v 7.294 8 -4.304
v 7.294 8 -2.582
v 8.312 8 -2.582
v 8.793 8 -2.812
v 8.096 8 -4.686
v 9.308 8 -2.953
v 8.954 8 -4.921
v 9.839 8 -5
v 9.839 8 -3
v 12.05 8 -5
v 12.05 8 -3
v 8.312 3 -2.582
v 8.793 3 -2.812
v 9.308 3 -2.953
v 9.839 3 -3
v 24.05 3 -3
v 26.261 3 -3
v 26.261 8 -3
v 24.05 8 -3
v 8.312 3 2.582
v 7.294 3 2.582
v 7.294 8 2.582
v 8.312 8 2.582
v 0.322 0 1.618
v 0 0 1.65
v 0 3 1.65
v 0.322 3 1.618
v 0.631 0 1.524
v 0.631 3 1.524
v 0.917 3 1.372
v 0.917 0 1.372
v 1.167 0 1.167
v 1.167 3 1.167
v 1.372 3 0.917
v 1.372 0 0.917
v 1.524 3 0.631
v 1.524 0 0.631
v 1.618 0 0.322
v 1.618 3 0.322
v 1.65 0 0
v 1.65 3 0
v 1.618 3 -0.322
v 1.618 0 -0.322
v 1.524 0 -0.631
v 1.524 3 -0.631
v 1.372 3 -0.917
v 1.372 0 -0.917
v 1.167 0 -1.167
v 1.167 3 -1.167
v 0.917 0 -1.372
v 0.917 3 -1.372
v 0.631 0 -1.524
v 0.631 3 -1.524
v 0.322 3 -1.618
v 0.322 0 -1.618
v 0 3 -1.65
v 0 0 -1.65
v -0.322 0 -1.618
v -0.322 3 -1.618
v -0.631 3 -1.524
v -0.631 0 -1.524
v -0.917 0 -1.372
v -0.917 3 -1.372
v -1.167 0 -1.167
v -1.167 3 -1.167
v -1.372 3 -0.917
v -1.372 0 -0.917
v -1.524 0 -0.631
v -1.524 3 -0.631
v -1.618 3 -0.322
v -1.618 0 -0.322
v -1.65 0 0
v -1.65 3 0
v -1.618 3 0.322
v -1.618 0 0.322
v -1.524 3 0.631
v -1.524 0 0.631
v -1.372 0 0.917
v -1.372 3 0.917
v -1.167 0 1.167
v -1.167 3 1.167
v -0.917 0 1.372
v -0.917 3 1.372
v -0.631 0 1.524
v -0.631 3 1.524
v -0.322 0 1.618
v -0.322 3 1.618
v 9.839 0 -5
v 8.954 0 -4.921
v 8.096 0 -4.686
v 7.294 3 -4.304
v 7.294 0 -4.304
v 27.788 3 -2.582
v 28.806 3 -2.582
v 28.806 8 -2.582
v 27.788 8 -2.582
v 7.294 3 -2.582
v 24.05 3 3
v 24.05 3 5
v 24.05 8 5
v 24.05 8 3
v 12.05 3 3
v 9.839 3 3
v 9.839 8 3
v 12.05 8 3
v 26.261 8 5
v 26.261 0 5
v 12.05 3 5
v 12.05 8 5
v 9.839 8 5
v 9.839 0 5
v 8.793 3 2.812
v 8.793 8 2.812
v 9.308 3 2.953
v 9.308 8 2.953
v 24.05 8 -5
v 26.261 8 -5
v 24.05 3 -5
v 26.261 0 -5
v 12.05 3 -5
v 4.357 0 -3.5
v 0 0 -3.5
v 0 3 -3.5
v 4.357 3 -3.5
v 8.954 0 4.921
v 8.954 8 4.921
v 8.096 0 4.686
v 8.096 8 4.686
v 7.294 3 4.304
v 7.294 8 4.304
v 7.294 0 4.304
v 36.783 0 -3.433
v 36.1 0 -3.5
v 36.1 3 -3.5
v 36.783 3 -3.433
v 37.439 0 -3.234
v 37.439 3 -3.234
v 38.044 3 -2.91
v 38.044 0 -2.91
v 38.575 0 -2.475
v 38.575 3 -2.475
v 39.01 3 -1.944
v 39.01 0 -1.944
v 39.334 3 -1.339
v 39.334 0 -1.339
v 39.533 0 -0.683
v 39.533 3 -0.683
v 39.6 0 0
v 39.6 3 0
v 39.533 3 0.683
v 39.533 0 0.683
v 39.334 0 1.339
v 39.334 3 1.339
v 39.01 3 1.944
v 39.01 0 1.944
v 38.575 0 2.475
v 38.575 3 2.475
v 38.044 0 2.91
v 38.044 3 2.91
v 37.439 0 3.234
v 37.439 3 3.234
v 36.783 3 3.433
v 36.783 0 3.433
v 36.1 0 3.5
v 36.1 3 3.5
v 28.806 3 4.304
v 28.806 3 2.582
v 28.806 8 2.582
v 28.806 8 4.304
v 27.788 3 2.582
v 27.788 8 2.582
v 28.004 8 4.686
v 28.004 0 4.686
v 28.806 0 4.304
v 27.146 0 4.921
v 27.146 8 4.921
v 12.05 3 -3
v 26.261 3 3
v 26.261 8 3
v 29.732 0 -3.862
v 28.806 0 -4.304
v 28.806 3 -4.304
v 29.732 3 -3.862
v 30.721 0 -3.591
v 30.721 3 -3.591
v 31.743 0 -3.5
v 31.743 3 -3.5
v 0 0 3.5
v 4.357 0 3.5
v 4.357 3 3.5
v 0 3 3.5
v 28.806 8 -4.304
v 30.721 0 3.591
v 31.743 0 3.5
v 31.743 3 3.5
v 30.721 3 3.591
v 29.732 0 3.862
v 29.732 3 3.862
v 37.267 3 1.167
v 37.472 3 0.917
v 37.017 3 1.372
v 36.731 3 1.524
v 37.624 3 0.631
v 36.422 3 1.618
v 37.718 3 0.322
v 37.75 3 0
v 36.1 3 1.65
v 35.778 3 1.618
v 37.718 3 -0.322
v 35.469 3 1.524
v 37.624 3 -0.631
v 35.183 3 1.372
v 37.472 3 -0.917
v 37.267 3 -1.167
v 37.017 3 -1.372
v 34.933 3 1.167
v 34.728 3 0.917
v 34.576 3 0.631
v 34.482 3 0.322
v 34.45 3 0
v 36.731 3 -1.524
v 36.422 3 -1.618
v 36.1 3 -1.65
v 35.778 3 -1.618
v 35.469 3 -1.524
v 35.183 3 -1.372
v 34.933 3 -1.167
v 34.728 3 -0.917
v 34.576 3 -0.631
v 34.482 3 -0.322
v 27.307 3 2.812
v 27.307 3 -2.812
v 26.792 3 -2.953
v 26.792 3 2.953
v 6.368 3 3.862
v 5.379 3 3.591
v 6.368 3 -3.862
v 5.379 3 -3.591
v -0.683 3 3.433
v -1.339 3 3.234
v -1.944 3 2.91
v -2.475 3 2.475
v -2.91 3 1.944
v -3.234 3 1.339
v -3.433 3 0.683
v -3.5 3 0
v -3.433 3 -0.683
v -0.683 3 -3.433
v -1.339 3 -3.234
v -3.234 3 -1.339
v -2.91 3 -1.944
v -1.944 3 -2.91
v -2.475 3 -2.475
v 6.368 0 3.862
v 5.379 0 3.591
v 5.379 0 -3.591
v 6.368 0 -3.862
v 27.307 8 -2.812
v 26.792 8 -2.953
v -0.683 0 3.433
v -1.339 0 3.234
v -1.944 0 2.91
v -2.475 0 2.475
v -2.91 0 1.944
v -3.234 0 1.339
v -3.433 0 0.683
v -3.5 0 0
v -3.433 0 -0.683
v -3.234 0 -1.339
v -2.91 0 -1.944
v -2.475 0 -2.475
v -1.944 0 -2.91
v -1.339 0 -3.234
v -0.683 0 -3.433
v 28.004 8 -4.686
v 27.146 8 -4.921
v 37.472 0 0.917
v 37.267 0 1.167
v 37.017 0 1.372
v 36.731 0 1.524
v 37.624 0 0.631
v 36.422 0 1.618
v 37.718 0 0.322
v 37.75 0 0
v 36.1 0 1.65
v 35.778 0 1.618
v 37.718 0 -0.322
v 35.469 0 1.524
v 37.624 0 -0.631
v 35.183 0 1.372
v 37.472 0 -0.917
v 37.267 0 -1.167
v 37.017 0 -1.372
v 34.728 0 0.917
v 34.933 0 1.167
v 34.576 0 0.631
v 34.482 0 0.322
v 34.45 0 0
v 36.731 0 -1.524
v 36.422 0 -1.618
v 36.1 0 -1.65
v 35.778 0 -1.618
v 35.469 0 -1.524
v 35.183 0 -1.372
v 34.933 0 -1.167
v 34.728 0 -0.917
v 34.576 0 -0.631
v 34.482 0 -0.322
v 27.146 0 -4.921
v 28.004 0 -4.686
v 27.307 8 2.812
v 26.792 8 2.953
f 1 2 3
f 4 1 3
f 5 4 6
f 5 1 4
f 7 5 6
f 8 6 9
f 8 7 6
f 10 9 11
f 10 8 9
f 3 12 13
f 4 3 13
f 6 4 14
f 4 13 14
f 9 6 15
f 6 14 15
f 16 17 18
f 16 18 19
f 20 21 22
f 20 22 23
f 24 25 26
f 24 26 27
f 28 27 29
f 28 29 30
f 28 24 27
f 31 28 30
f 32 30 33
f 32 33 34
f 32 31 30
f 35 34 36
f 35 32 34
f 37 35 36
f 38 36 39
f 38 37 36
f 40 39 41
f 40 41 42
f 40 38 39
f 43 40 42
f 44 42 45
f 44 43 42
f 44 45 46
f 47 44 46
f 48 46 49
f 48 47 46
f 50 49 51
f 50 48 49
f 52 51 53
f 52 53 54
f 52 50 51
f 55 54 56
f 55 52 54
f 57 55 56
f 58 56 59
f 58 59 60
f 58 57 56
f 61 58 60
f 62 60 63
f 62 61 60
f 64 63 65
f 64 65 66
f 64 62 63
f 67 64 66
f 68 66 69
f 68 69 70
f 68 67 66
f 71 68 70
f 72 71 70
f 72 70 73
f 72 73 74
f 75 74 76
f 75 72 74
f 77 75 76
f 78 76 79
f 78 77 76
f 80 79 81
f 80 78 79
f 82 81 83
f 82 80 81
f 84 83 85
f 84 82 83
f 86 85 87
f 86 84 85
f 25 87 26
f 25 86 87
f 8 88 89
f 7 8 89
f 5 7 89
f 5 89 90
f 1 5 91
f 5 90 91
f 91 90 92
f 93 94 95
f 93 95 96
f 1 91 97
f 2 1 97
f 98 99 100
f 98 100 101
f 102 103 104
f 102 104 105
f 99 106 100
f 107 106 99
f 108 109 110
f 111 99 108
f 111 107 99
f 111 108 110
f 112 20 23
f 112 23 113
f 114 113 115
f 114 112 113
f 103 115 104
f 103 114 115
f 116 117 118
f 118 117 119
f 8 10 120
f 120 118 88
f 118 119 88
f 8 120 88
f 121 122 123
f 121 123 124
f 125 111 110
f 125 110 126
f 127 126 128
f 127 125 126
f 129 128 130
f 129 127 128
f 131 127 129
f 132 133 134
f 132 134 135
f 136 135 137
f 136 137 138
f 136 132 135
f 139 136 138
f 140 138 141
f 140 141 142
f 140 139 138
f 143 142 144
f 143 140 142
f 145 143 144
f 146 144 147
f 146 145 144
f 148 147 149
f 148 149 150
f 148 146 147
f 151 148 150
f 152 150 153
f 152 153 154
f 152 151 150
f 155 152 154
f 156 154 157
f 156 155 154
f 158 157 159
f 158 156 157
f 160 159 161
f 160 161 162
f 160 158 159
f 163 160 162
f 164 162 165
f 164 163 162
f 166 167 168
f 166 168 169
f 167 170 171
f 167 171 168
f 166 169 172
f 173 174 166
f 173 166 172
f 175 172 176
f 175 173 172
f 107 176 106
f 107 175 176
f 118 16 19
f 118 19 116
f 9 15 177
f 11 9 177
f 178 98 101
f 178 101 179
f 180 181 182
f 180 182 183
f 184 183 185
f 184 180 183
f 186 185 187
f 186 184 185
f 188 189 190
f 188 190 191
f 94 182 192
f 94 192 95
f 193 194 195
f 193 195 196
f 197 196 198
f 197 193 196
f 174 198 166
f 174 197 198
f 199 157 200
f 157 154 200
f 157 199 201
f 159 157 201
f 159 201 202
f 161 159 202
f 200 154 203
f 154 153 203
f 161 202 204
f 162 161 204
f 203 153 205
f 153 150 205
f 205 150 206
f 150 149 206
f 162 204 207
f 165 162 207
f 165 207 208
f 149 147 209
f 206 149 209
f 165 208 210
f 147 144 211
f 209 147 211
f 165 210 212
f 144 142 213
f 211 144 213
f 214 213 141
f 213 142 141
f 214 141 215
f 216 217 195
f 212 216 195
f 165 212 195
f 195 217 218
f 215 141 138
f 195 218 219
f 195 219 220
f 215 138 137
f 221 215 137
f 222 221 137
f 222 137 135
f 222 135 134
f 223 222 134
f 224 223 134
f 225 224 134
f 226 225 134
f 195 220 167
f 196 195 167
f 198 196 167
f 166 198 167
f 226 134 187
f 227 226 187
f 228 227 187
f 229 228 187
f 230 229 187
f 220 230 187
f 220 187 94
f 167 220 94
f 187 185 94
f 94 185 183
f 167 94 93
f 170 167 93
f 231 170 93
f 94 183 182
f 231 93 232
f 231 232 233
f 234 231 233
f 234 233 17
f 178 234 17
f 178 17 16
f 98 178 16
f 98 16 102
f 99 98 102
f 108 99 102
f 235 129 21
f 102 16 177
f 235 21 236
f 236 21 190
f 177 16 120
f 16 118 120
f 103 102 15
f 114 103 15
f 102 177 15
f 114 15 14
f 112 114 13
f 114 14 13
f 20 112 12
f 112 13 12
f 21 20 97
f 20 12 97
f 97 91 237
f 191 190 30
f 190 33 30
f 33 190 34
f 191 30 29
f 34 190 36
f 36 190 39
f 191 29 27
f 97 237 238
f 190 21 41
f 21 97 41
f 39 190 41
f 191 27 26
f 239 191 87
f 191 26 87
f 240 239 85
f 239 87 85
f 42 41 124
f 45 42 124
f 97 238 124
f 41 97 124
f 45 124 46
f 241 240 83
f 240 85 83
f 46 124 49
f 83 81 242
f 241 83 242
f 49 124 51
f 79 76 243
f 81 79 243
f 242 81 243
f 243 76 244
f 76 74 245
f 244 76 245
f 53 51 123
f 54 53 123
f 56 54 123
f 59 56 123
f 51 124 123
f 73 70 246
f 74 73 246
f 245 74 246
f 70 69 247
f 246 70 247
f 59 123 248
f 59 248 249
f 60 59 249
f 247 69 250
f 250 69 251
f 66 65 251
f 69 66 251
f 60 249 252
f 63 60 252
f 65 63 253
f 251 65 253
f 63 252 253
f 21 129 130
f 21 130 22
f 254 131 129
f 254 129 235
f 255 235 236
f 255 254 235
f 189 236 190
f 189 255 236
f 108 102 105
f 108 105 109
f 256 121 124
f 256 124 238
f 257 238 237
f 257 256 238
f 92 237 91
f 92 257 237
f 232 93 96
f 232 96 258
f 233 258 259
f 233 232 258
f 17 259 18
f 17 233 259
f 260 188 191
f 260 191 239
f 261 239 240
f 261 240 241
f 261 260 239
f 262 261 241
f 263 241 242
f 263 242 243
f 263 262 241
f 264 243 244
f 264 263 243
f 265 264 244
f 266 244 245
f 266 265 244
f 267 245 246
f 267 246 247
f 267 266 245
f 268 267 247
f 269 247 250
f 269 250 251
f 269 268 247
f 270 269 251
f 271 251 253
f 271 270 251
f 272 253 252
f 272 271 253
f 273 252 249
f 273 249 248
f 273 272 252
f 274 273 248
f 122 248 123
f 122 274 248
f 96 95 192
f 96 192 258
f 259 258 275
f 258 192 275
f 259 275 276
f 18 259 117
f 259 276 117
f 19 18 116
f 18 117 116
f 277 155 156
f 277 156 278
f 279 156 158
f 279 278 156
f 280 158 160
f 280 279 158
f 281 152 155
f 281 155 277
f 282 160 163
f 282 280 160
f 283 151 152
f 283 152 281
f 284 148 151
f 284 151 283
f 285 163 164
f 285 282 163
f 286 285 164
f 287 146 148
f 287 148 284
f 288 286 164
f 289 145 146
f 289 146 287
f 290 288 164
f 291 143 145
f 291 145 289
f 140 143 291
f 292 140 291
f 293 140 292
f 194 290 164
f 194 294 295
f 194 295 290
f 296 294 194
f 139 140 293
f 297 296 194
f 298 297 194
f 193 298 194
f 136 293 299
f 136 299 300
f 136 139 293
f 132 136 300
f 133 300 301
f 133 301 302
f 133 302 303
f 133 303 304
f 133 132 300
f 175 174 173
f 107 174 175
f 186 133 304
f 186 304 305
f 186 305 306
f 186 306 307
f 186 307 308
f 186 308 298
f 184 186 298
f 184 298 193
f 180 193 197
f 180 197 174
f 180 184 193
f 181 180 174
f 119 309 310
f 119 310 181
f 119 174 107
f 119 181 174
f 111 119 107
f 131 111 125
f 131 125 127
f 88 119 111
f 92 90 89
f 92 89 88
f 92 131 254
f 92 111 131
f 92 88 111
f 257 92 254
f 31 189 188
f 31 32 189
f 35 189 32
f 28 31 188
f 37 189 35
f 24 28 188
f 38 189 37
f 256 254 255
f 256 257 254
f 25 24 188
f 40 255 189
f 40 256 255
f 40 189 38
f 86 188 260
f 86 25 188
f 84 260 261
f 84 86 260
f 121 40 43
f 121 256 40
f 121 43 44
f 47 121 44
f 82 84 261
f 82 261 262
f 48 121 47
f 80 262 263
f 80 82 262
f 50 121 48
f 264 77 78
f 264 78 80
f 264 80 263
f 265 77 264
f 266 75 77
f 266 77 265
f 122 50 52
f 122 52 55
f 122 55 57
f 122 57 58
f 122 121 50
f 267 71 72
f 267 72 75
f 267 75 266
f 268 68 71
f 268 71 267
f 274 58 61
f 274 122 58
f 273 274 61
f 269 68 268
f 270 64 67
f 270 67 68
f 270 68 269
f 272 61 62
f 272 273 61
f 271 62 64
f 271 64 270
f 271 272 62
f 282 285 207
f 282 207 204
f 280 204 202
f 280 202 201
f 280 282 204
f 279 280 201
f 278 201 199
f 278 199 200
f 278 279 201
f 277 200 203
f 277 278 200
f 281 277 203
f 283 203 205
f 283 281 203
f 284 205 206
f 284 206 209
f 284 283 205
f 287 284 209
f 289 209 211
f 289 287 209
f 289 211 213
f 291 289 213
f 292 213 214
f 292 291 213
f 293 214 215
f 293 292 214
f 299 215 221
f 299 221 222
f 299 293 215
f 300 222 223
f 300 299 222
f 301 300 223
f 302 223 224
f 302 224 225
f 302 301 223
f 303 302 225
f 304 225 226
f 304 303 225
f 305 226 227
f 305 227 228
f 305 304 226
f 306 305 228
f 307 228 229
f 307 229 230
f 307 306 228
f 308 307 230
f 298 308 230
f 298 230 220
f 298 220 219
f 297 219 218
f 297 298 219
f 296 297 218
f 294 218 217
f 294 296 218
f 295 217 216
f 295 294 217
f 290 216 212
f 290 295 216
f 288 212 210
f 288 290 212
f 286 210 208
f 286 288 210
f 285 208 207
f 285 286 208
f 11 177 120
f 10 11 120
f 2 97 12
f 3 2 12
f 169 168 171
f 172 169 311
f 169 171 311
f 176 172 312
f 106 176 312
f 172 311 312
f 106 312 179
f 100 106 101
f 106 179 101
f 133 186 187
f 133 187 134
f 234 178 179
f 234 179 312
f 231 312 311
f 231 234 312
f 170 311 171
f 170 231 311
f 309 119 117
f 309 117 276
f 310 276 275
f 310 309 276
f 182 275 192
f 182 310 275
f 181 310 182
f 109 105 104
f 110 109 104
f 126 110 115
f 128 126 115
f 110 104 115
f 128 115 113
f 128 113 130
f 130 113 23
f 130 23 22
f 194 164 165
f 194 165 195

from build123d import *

# Parameters (mm, degrees)
SKETCH2_R           = 1.65
BOSS_EXTRUDE1_DEPTH = 3
BOSS_EXTRUDE2_DEPTH = 5


with BuildPart() as part:
    # Sketch2 → Boss-Extrude1 (new body)
    with BuildSketch(Plane(origin=(0, 0, 0), x_dir=(1, 0, 0), z_dir=(0, 1, 0))):
        with BuildLine():
            Line((0, 3.5), (4.356739527, 3.5))
            ThreePointArc((4.356739527, 3.5), (5.879286162, 3.704522124), (7.293887604, 4.303588328))
            ThreePointArc((7.293887604, 4.303588328), (8.519819988, 4.822755522), (9.839300635, 5))
            Line((9.839300635, 5), (26.260699365, 5))
            ThreePointArc((26.260699365, 5), (27.580180012, 4.822755522), (28.806112396, 4.303588328))
            ThreePointArc((28.806112396, 4.303588328), (30.220713838, 3.704522124), (31.743260473, 3.5))
            Line((31.743260473, 3.5), (36.1, 3.5))
            ThreePointArc((36.1, 3.5), (39.6, 0), (36.1, -3.5))
            Line((36.1, -3.5), (31.743260473, -3.5))
            ThreePointArc((31.743260473, -3.5), (30.220713838, -3.704522124), (28.806112396, -4.303588328))
            ThreePointArc((28.806112396, -4.303588328), (27.580180012, -4.822755522), (26.260699365, -5))
            Line((26.260699365, -5), (9.839300635, -5))
            ThreePointArc((9.839300635, -5), (8.519819988, -4.822755522), (7.293887604, -4.303588328))
            ThreePointArc((7.293887604, -4.303588328), (5.879286162, -3.704522124), (4.356739527, -3.5))
            Line((4.356739527, -3.5), (0, -3.5))
            ThreePointArc((0, -3.5), (-3.5, 0), (0, 3.5))
        make_face()
        with Locations(Location((0, 0, 0), (0, 0, 270))):
            Circle(SKETCH2_R, mode=Mode.SUBTRACT)
        with Locations(Location((36.1, 0, 0), (0, 0, 270))):
            Circle(SKETCH2_R, mode=Mode.SUBTRACT)
    extrude(amount=BOSS_EXTRUDE1_DEPTH)

    # Sketch3 → Boss-Extrude2 (add)
    with BuildSketch(Plane(origin=(0, 3, 0), x_dir=(1, 0, 0), z_dir=(0, 1, 0))):
        with BuildLine():
            Line((7.293887604, 4.303588328), (7.293887604, 2.582152997))
            Line((7.293887604, 2.582152997), (8.312052816, 2.582152997))
            ThreePointArc((8.312052816, 2.582152997), (9.047612247, 2.893653313), (9.839300635, 3))
            Line((9.839300635, 3), (12.05, 3))
            Line((12.05, 3), (12.05, 5))
            Line((12.05, 5), (9.839300635, 5))
            ThreePointArc((9.839300635, 5), (8.519819988, 4.822755522), (7.293887604, 4.303588328))
        make_face()
        with BuildLine():
            Line((28.806112396, 4.303588328), (28.806112396, 2.582152997))
            Line((28.806112396, 2.582152997), (27.787947184, 2.582152997))
            ThreePointArc((27.787947184, 2.582152997), (27.052387753, 2.893653313), (26.260699365, 3))
            Line((26.260699365, 3), (24.05, 3))
            Line((24.05, 3), (24.05, 5))
            Line((24.05, 5), (26.260699365, 5))
            ThreePointArc((26.260699365, 5), (27.580180012, 4.822755522), (28.806112396, 4.303588328))
        make_face()
        with BuildLine():
            Line((9.839300635, -3), (12.05, -3))
            Line((12.05, -3), (12.05, -5))
            Line((12.05, -5), (9.839300635, -5))
            ThreePointArc((9.839300635, -5), (8.519819988, -4.822755522), (7.293887604, -4.303588328))
            Line((7.293887604, -4.303588328), (7.293887604, -2.582152997))
            Line((7.293887604, -2.582152997), (8.312052816, -2.582152997))
            ThreePointArc((8.312052816, -2.582152997), (9.047612247, -2.893653313), (9.839300635, -3))
        make_face()
        with BuildLine():
            Line((27.787947184, -2.582152997), (28.806112396, -2.582152997))
            Line((28.806112396, -2.582152997), (28.806112396, -4.303588328))
            ThreePointArc((28.806112396, -4.303588328), (27.580180012, -4.822755522), (26.260699365, -5))
            Line((26.260699365, -5), (24.05, -5))
            Line((24.05, -5), (24.05, -3))
            Line((24.05, -3), (26.260699365, -3))
            ThreePointArc((26.260699365, -3), (27.052387753, -2.893653313), (27.787947184, -2.582152997))
        make_face()
    extrude(amount=BOSS_EXTRUDE2_DEPTH)


solid = part.part
